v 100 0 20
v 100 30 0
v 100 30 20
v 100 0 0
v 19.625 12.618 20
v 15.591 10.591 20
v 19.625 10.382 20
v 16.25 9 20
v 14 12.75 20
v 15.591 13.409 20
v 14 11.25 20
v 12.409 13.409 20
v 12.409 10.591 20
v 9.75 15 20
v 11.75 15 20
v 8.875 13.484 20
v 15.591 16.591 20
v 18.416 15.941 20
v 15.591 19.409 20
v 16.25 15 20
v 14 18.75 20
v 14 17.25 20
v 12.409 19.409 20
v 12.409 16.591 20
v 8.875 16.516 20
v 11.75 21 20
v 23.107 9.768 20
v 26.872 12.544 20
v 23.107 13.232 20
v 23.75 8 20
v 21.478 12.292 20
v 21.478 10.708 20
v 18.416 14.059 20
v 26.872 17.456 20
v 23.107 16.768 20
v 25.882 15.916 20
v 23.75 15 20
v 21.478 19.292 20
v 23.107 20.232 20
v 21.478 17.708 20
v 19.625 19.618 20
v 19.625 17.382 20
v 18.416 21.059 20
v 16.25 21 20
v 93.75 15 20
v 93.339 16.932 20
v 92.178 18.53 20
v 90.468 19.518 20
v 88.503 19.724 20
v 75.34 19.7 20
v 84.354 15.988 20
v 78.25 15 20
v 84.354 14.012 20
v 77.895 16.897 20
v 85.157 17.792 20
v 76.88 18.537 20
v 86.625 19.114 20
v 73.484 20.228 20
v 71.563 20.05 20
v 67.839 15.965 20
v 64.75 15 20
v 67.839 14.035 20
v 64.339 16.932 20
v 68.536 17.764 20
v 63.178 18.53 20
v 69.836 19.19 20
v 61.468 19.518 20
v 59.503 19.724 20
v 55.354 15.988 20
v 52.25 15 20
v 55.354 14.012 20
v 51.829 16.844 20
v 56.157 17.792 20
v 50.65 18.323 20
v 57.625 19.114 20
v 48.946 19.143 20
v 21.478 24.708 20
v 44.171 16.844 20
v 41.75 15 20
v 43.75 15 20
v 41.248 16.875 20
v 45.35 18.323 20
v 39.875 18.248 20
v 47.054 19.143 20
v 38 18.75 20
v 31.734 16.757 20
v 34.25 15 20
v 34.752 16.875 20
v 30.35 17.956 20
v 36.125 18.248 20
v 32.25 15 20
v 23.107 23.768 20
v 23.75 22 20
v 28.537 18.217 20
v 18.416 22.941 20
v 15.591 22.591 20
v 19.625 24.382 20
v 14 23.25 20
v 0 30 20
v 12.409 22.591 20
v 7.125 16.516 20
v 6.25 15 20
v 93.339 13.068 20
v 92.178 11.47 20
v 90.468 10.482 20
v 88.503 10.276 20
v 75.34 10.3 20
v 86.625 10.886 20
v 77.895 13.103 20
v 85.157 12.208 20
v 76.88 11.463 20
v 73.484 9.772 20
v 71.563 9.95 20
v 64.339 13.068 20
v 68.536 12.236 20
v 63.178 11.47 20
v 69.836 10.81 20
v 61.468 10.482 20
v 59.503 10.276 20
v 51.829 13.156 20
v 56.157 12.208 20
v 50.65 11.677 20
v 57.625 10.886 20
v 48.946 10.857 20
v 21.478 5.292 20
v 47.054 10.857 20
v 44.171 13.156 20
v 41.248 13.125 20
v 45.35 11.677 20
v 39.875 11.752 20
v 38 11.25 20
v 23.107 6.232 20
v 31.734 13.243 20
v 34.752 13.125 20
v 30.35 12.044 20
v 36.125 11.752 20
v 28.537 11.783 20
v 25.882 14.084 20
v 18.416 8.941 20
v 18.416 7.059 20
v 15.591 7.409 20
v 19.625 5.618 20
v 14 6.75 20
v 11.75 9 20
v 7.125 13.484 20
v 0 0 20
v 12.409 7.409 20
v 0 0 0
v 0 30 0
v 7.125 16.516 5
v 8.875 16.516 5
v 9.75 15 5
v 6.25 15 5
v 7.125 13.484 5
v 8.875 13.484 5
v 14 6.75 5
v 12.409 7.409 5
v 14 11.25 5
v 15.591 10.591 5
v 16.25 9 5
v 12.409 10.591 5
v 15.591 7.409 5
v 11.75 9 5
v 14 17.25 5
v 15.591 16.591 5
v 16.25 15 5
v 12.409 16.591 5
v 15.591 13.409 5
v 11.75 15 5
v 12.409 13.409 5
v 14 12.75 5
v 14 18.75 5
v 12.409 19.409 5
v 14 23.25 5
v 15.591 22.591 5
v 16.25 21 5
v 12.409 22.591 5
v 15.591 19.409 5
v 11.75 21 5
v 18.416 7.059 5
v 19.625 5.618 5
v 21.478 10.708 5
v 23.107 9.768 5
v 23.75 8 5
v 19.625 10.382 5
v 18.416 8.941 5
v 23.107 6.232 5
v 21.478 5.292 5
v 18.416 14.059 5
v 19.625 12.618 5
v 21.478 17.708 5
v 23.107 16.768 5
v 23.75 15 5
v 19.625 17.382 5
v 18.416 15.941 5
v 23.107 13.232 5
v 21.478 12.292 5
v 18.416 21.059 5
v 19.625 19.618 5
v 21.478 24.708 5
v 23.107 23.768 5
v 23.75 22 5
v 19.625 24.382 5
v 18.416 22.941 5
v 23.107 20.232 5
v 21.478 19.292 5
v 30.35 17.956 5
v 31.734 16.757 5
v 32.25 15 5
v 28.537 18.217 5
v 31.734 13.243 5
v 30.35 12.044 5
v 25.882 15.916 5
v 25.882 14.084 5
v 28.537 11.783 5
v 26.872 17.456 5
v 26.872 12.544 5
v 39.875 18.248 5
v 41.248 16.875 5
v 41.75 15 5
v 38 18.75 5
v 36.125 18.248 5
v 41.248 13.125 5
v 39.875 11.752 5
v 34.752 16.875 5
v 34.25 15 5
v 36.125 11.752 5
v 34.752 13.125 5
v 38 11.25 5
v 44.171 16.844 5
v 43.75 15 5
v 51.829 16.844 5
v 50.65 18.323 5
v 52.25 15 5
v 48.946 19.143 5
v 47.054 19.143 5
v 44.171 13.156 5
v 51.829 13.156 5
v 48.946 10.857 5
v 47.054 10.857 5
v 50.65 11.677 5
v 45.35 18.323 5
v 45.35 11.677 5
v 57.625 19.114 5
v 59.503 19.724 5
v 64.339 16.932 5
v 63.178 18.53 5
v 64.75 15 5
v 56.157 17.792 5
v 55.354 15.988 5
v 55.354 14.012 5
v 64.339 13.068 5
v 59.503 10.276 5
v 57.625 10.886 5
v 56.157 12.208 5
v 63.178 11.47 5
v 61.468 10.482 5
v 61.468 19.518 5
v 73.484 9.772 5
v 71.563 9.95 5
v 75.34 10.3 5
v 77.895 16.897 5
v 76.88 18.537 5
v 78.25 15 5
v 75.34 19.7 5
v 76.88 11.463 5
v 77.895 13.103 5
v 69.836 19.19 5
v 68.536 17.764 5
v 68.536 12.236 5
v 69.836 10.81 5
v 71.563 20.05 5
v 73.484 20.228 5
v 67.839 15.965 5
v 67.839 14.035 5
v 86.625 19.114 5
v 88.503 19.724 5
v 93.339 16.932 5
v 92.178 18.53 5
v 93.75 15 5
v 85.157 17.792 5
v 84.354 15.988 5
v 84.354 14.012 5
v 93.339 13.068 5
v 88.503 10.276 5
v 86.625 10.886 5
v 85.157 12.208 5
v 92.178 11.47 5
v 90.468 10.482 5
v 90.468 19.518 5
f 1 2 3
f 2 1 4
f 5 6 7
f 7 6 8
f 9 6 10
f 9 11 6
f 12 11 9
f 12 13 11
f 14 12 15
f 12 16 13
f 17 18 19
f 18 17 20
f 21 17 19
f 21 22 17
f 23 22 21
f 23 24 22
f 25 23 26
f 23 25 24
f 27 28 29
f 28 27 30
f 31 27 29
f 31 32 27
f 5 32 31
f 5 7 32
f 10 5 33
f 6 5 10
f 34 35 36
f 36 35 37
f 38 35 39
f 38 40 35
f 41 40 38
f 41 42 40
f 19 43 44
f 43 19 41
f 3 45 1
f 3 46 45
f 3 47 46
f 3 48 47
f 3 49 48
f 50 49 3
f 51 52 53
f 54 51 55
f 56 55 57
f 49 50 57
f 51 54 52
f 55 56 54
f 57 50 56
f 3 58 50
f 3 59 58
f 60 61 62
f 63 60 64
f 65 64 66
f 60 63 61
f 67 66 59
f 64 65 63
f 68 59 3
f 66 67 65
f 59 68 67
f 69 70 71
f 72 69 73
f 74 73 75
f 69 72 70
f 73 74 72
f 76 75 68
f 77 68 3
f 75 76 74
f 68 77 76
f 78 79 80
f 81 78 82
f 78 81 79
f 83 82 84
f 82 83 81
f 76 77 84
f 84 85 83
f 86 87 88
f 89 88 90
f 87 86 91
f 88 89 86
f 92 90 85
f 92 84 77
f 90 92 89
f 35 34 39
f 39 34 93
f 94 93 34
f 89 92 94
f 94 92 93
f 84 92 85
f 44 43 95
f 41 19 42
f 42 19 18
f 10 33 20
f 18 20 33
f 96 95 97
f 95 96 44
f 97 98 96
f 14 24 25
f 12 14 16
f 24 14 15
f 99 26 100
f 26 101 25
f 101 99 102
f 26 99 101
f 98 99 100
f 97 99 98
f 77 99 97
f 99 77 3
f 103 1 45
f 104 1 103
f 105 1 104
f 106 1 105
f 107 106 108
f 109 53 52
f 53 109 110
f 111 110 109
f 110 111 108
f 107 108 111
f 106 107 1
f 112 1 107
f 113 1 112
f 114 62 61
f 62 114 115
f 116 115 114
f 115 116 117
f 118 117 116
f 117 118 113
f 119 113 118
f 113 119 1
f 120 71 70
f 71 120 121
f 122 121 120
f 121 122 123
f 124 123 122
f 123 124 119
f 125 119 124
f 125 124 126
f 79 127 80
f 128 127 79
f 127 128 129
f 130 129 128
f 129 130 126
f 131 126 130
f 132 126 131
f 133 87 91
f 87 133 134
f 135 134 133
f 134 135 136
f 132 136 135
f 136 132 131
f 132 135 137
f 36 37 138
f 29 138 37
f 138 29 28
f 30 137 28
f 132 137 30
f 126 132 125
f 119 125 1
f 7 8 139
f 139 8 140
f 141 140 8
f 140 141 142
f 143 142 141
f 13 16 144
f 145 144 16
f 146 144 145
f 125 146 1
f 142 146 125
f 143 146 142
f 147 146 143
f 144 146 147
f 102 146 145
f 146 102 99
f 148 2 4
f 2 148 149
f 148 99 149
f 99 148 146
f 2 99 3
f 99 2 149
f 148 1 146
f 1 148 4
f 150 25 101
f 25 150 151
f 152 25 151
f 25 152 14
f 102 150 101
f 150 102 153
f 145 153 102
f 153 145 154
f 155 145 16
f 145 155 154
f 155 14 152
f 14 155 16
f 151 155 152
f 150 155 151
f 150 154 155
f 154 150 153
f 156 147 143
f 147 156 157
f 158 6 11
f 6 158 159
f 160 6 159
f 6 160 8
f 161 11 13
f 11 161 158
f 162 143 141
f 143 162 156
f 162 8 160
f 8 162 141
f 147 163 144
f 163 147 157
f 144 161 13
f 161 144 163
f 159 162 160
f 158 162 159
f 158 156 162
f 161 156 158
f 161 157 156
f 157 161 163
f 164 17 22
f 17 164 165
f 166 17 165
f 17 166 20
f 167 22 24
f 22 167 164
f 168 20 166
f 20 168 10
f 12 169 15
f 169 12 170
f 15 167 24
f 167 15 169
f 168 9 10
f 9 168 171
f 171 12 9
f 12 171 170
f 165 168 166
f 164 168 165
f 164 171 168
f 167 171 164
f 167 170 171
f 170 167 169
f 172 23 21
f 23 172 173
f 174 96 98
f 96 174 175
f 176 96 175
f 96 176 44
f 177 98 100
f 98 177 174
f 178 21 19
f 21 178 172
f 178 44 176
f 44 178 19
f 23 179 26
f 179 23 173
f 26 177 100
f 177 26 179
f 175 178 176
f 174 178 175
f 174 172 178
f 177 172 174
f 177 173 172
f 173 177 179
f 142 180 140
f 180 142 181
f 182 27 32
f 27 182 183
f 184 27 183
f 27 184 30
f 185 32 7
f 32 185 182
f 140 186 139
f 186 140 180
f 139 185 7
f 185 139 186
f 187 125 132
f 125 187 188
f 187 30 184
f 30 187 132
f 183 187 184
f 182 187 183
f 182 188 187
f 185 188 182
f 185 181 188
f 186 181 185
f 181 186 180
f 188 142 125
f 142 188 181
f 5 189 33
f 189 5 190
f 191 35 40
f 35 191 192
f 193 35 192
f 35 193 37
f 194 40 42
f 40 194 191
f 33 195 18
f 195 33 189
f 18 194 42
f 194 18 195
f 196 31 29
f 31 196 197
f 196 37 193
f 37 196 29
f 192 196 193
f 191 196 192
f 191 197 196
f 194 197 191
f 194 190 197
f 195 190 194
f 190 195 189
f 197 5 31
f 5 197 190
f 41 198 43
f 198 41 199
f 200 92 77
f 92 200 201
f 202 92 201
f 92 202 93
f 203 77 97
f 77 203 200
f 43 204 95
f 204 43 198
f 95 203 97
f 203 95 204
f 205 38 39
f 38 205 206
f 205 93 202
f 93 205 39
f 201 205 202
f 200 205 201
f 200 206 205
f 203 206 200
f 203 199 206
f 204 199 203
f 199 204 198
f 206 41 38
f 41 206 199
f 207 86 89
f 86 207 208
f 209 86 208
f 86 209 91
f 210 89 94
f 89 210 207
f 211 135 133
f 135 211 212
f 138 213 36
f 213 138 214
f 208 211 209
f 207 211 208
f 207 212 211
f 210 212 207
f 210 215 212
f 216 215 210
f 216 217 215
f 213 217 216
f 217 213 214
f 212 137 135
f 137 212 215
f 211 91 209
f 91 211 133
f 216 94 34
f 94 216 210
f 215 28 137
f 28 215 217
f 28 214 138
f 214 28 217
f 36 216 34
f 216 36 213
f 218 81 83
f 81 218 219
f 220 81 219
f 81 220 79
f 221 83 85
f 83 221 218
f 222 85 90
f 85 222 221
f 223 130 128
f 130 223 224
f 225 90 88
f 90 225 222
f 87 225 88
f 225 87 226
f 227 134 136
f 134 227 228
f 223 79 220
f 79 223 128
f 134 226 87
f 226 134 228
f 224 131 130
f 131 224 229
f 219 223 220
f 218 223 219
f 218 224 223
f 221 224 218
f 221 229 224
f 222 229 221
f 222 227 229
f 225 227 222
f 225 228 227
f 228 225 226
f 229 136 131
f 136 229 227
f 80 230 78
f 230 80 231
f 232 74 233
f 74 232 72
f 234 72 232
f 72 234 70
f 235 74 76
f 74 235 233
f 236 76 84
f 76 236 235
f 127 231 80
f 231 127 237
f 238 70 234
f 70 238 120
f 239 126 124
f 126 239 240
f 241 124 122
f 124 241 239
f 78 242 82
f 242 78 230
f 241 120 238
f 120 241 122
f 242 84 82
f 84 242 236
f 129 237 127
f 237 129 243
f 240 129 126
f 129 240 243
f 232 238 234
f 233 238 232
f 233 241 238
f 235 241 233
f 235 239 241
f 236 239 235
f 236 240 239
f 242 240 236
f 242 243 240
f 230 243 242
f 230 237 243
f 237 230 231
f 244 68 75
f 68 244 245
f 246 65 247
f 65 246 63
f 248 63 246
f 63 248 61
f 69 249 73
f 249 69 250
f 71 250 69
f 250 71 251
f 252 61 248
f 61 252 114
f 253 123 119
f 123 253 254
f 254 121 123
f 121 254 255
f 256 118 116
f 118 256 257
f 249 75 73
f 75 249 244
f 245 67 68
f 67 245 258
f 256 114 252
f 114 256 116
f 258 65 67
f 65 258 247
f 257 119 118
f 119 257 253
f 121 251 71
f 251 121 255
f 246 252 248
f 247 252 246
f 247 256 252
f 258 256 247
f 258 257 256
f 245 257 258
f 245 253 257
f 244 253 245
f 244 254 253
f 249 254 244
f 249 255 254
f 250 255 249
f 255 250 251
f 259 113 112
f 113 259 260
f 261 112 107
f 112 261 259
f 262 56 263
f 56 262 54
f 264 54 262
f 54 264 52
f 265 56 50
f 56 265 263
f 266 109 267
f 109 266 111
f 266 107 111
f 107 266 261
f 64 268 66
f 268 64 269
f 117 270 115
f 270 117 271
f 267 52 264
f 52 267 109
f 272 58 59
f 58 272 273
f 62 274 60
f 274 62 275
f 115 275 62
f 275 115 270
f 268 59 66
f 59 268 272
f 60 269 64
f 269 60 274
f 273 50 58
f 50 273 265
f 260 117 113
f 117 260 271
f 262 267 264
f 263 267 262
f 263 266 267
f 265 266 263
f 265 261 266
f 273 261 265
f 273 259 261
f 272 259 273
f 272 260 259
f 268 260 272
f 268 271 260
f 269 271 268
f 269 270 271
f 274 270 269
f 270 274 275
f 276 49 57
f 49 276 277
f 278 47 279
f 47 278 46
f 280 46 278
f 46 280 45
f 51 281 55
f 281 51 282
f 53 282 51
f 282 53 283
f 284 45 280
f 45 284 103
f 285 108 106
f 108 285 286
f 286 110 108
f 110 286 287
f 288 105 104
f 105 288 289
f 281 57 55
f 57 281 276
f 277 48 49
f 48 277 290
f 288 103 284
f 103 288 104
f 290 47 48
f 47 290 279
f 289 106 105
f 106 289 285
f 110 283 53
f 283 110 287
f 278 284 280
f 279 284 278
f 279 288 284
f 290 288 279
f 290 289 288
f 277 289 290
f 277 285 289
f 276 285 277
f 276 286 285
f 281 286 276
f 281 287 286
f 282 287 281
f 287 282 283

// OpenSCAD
difference() {
    cube([100, 30, 20]);
    // 3mm
    translate([ 3+0*2+5, 30/2-0, 5]) cylinder(d=3.5, h=20);
    translate([ 3+0*2+5, 30/2-0, 5]) cylinder(d=3.5, h=20);
    // 4mm
    translate([ 7+1*2+5, 30/2-6, 5]) cylinder(d=4.5, h=20);
    translate([ 7+1*2+5, 30/2-0, 5]) cylinder(d=4.5, h=20);
    translate([ 7+1*2+5, 30/2+6, 5]) cylinder(d=4.5, h=20);
    // 5mm
    translate([12+2*2+5, 30/2-7, 5]) cylinder(d=5.5, h=20);
    translate([12+2*2+5, 30/2-0, 5]) cylinder(d=5.5, h=20);
    translate([12+2*2+5, 30/2+7, 5]) cylinder(d=5.5, h=20);
    // 6mm
    translate([18+3*2+5, 30/2-0, 5]) cylinder(d=6.5, h=20);
    // 7mm
    translate([25+4*2+5, 30/2-0, 5]) cylinder(d=7.5, h=20);
    // 8mm
    translate([33+5*2+5, 30/2-0, 5]) cylinder(d=8.5, h=20);
    // 9mm
    translate([42+6.5*2+5, 30/2-0, 5]) cylinder(d=9.5, h=20);
    // 10mm
    translate([52+8*2+5, 30/2-0, 5]) cylinder(d=10.5, h=20);
    // 12mm
    translate([64+10*2+5, 30/2-0, 5]) cylinder(d=9.5, h=20);
}
